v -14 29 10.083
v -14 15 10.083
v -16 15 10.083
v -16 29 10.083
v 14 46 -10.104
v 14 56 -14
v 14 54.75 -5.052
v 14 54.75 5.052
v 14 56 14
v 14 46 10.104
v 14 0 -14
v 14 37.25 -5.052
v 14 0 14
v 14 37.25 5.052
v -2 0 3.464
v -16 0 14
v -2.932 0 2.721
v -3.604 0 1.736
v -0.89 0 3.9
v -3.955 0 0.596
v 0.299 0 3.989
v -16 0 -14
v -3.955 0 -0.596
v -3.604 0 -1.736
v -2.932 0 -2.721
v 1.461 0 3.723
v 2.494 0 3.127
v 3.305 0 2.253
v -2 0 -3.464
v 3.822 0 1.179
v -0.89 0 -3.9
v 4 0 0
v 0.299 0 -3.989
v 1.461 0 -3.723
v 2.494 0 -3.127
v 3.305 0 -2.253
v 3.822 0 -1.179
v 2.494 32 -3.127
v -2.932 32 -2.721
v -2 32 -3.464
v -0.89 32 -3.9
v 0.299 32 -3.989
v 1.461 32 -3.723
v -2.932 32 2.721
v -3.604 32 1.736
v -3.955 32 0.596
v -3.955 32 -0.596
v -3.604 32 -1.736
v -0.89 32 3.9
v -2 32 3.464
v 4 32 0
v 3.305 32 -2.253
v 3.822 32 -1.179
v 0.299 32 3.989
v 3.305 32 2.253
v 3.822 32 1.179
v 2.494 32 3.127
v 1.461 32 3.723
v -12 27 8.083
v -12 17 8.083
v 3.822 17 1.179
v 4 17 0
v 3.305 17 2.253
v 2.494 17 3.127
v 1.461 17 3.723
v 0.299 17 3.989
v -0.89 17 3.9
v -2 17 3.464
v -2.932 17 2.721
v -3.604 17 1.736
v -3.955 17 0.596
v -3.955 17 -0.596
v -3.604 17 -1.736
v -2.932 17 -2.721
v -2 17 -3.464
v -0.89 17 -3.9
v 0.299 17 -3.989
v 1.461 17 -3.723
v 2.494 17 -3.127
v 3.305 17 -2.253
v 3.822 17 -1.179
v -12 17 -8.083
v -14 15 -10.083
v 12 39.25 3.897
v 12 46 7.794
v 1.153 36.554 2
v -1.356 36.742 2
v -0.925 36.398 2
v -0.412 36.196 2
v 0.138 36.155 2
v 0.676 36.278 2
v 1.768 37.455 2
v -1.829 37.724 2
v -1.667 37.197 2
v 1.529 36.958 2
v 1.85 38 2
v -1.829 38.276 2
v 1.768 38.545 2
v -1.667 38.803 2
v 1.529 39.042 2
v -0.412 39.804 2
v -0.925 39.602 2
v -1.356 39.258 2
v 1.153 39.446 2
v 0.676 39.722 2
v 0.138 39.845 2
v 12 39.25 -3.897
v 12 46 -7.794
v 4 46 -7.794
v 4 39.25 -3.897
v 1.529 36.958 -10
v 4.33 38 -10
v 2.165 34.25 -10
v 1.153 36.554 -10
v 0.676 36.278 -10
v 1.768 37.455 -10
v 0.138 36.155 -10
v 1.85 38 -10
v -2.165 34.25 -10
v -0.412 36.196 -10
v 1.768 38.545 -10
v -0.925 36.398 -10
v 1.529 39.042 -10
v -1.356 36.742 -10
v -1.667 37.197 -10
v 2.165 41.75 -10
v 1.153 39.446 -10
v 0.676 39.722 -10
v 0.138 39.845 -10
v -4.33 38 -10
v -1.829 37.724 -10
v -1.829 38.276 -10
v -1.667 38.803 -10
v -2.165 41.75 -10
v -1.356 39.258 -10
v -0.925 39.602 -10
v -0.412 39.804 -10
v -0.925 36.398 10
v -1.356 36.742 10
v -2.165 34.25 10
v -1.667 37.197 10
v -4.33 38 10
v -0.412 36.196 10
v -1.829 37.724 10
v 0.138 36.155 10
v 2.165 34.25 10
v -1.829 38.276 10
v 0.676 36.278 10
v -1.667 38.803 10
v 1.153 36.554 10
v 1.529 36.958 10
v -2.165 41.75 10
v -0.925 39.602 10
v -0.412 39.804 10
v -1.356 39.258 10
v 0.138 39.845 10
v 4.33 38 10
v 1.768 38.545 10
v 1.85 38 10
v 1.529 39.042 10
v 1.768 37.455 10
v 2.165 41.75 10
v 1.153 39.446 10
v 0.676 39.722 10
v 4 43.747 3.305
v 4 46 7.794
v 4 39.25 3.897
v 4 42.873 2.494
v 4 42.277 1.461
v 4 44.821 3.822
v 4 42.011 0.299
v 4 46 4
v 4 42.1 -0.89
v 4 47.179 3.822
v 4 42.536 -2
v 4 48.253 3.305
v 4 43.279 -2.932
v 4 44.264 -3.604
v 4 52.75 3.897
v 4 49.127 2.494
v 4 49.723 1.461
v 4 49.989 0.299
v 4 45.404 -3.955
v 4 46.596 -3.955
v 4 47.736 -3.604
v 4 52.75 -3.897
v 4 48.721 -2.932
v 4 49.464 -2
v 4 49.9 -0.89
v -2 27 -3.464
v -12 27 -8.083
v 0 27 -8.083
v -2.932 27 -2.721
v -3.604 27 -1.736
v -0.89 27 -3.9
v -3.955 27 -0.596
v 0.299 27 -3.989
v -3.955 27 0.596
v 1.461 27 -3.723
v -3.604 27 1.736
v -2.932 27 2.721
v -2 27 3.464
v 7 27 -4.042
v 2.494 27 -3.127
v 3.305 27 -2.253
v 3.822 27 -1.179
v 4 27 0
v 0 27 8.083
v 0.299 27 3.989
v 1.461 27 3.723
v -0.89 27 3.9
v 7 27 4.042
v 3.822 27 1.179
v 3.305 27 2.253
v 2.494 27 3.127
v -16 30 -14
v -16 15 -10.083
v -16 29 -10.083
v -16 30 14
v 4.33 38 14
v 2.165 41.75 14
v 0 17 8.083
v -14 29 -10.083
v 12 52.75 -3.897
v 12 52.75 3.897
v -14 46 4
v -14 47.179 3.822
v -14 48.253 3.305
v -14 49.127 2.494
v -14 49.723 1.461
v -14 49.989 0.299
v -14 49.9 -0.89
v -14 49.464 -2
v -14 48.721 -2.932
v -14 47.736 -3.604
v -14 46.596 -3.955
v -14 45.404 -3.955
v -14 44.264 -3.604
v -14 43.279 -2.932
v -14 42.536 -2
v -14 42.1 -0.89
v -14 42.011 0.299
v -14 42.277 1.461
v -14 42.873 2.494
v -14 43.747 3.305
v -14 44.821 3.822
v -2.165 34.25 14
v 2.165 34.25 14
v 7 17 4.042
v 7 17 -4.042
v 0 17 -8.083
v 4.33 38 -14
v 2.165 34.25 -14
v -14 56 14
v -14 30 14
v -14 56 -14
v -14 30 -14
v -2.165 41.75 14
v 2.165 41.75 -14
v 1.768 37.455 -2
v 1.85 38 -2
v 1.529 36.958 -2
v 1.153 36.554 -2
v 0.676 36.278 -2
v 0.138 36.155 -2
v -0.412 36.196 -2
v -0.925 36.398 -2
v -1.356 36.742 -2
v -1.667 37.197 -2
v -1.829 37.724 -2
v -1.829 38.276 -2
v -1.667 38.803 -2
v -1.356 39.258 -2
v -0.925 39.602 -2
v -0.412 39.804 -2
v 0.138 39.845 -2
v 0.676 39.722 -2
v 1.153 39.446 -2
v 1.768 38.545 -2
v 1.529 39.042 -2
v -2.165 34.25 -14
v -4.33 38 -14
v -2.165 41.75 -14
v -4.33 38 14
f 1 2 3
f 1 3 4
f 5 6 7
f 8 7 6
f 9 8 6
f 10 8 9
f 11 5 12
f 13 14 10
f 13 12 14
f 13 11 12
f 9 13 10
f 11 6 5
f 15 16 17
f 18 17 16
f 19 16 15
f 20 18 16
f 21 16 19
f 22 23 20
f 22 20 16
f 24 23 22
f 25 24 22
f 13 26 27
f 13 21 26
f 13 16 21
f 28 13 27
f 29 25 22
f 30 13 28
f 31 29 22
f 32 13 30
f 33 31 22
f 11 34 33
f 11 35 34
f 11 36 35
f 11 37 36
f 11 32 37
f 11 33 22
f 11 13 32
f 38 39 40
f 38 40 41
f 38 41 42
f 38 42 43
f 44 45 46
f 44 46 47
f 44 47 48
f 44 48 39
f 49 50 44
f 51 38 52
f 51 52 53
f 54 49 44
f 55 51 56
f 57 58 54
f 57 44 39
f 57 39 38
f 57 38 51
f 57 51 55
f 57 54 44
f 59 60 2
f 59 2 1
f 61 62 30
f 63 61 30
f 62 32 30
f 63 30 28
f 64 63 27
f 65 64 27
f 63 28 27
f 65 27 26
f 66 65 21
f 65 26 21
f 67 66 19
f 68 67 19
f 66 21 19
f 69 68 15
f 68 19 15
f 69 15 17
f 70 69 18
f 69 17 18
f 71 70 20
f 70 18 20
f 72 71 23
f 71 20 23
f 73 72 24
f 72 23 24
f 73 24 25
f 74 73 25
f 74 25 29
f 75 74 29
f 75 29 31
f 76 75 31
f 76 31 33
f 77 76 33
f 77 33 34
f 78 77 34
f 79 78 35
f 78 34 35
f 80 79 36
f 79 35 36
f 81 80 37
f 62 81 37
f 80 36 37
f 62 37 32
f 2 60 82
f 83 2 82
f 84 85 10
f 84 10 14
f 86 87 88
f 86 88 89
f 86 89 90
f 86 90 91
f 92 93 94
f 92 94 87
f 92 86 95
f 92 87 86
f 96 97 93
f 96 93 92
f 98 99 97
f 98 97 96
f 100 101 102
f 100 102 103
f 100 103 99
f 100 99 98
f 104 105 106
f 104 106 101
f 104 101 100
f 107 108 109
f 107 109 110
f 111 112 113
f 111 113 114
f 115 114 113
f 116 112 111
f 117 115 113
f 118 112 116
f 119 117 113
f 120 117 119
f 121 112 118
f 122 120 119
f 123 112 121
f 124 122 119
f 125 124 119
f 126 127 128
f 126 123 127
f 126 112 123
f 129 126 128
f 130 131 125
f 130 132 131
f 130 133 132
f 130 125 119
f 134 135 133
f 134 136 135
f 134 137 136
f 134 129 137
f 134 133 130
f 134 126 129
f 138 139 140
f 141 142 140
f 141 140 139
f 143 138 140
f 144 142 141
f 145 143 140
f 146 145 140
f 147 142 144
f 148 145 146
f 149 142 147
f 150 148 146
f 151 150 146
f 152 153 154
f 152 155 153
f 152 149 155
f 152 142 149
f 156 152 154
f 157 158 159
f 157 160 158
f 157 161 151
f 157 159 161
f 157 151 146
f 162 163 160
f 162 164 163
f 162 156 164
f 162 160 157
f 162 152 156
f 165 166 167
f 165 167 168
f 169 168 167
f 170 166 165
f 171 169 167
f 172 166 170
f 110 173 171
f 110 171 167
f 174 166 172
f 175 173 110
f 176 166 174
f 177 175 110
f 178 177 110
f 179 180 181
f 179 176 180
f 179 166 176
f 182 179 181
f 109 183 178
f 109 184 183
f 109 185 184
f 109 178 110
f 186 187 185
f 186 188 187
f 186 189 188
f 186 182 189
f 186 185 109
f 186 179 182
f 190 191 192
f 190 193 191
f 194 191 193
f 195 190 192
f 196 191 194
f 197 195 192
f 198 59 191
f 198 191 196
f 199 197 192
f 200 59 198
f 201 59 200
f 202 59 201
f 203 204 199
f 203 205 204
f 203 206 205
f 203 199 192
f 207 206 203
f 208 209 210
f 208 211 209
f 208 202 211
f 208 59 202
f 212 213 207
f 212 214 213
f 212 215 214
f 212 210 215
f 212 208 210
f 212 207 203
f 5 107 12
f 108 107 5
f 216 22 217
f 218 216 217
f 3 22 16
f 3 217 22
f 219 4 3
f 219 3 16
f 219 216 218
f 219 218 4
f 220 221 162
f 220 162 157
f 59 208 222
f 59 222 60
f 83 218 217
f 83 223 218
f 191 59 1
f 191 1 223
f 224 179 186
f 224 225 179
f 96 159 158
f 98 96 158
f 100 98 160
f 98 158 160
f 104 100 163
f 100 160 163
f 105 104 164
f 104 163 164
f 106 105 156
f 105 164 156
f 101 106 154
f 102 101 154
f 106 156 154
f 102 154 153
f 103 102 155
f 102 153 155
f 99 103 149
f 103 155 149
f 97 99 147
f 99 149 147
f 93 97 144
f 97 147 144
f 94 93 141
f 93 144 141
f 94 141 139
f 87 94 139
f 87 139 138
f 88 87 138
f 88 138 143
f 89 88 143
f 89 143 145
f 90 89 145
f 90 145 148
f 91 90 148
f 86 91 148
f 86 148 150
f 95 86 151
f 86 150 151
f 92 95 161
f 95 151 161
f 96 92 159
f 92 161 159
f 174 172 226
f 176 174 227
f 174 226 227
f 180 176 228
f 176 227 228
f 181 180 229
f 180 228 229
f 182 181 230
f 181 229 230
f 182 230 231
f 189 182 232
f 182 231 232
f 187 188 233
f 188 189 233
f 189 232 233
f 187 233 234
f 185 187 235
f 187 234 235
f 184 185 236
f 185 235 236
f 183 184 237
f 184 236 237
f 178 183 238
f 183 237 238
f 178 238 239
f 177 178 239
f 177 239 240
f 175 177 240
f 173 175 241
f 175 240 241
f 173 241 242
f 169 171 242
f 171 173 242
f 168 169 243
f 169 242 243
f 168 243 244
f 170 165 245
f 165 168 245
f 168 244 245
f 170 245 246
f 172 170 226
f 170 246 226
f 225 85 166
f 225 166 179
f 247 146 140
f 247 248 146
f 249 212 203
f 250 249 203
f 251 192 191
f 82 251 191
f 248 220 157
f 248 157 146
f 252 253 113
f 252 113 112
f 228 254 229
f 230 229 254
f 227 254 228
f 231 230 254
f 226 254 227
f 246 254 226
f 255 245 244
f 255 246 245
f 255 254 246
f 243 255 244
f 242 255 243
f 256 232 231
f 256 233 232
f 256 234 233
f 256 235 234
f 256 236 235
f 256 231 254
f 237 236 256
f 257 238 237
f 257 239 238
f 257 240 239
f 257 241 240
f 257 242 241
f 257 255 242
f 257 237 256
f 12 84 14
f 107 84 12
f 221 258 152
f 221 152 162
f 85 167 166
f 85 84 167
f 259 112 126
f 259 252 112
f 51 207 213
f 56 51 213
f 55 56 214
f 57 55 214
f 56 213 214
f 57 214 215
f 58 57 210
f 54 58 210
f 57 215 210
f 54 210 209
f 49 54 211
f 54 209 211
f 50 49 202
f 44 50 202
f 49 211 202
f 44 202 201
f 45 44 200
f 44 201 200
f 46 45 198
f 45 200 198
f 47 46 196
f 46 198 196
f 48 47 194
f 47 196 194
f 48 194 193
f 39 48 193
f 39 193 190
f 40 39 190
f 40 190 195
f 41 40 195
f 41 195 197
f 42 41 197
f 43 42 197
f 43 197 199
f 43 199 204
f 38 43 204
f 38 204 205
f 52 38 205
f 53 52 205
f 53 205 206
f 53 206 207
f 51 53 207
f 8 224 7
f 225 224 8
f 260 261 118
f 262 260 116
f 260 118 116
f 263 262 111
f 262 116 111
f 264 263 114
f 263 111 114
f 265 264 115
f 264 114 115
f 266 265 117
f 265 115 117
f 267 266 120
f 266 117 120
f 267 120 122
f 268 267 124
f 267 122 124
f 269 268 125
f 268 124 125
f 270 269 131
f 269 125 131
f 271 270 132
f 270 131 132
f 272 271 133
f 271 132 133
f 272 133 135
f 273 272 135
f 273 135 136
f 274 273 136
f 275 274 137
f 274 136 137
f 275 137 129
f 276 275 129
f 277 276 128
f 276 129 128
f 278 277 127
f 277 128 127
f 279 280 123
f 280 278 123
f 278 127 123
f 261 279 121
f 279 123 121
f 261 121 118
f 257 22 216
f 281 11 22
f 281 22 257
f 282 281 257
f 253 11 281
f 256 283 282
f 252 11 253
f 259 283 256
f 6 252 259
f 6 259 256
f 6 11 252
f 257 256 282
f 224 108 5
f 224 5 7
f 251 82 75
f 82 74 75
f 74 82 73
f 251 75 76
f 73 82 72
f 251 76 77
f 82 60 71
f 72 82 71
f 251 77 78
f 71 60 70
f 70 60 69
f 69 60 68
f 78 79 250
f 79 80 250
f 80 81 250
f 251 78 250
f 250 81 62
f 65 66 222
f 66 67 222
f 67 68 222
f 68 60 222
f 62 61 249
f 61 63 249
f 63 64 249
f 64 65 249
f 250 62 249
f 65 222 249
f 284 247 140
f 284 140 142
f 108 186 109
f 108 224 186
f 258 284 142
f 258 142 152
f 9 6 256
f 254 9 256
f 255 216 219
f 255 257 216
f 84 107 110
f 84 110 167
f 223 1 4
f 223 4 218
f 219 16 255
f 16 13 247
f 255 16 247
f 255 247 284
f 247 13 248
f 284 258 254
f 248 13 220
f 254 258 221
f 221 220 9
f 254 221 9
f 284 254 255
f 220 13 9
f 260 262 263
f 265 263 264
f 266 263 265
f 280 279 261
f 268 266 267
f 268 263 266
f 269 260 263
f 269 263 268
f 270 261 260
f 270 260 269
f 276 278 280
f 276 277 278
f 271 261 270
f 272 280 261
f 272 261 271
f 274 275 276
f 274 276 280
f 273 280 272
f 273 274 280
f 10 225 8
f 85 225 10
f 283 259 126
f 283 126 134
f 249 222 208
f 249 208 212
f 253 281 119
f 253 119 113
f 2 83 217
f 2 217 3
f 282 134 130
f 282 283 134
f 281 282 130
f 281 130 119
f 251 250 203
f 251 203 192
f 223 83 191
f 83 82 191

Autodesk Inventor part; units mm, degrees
ref_plane "YZ Plane" through (0, 0, 0) normal (1, 0, 0) x (0, 1, 0)
ref_plane "XZ Plane" through (0, 0, 0) normal (0, 1, 0) x (-1, 0, 0)
ref_plane "XY Plane" through (0, 0, 0) normal (0, 0, 1) x (1, 0, 0)
sketch "Эскиз1" plane through (0, 0, 0) normal (0, 1, 0) x (-1, 0, 0)
  line L0 (-14, 14) -> (14, 14)
  line L1 (14, 14) -> (14, -14)
  line L2 (14, -14) -> (-14, -14)
  line L3 (-14, -14) -> (-14, 14)
  line L4 (-14, 14) -> (14, -14) construction
  line L5 (14, 14) -> (-14, -14) construction
  point P0 (0, 0)
  dimension "d0" = 28
  dimension "d1" = 28
extrude "Выдавливание1" add sketch "Эскиз1" along normal blind 56
sketch "Эскиз2" plane through (0, 0, 0) normal (0, -1, 0) x (1, 0, 0)
  circle A0 centre (0, 0) radius 4
extrude "Выдавливание2" cut sketch "Эскиз2" against normal blind 32
sketch "Эскиз3" plane through (-14, 0, -14) normal (-1, 0, 0) x (0, 0, 1)
  circle A0 centre (14, 46) radius 4 projected
  point P0 (14, 0)
extrude "Выдавливание3" cut sketch "Эскиз3" against normal through all
sketch "Эскиз4" plane through (14, 0, 14) normal (1, 0, 0) x (0, 0, -1)
  circle A0 centre (14, 46) radius 4 projected
  line L0 (6.2058, 46) -> (10.1029, 52.75)
  line L1 (10.1029, 52.75) -> (17.8971, 52.75)
  line L2 (17.8971, 52.75) -> (21.7942, 46)
  line L3 (21.7942, 46) -> (17.8971, 39.25)
  line L4 (17.8971, 39.25) -> (10.1029, 39.25)
  line L5 (10.1029, 39.25) -> (6.2058, 46)
  line L6 (0, 56) -> (28, 56) projected
  point P0 (14, 0)
  dimension "d8" = 13.5
extrude "Выдавливание4" cut sketch "Эскиз4" against normal blind 10
chamfer "Фаска1" distance 2 angle 45 6 edges at (14, 39.25, 0) (14, 42.625, -5.8457) (14, 49.375, -5.8457) (14, 52.75, 0) (14, 49.375, 5.8457) (14, 42.625, 5.8457)
ref_plane "РабПлоскость1" through (0, 22, 0) normal (0, -1, 0) x (1, 0, 0)
sketch "Эскиз5" plane through (0, 22, 0) normal (0, -1, 0) x (1, 0, 0)
  line L0 (0, 8.0829) -> (7, 4.0415)
  line L1 (7, 4.0415) -> (7, -4.0415)
  line L2 (7, -4.0415) -> (0, -8.0829)
  line L3 (0, -8.0829) -> (-7, -4.0415)
  line L4 (-7, -4.0415) -> (-7, 4.0415)
  line L5 (-7, 4.0415) -> (0, 8.0829)
  line L6 (0, 8.0829) -> (-14, 8.0829)
  line L7 (-14, -14) -> (-14, 14) projected
  line L8 (0, -8.0829) -> (-14, -8.0829)
  line L9 (-14, 8.0829) -> (-14, -8.0829)
  point P0 (0, 0)
  point P1 (0, 0)
  dimension "d15" = 14
extrude "Выдавливание5" cut sketch "Эскиз5" along normal mid plane 10
chamfer "Фаска2" distance 2 angle 45 4 edges at (-14, 27, 0) (-14, 22, 8.0829) (-14, 17, 0) (-14, 22, -8.0829)
sketch "Эскиз6" plane through (-14, 0, -14) normal (-1, 0, 0) x (0, 0, 1)
  line L0 (28, 0) -> (28, 56) projected
  line L1 (0, 0) -> (0, 56) projected
  line L2 (28, 0) -> (0, 0)
  line L3 (0, 0) -> (0, 30)
  line L4 (0, 30) -> (28, 30)
  line L5 (28, 30) -> (28, 0)
  line L6 (24.0829, 15) -> (24.0829, 29) projected
  line L7 (3.9171, 15) -> (24.0829, 15) projected
  line L8 (3.9171, 29) -> (3.9171, 15) projected
  line L9 (24.0829, 29) -> (3.9171, 29) projected
  point P0 (14, 0)
  point P1 (28, 30)
  dimension "d21" = 30
extrude "Выдавливание6" add sketch "Эскиз6" along normal blind 2
sketch "Эскиз7" plane through (-14, 56, 14) normal (0, 0, 1) x (1, 0, 0)
  circle A0 centre (14, -18) radius 1.85 projected
  point P0 (14, -56)
extrude "Выдавливание7" cut sketch "Эскиз7" against normal blind 12
mirror "Зеркальное отражение1" about plane through (0, 0, 0) normal (0, 0, 1) of "Выдавливание7"
sketch "Эскиз8" plane through (-14, 56, 14) normal (0, 0, 1) x (1, 0, 0)
  circle A0 centre (14, -18) radius 1.85 projected
  line L0 (9.6699, -18) -> (11.8349, -14.25)
  line L1 (11.8349, -14.25) -> (16.1651, -14.25)
  line L2 (16.1651, -14.25) -> (18.3301, -18)
  line L3 (18.3301, -18) -> (16.1651, -21.75)
  line L4 (16.1651, -21.75) -> (11.8349, -21.75)
  line L5 (11.8349, -21.75) -> (9.6699, -18)
  point P0 (14, -56)
  dimension "d26" = 7.5
extrude "Выдавливание8" cut sketch "Эскиз8" against normal blind 4 contours A0 | L0 L1 L2 L3 L4 L5
mirror "Зеркальное отражение2" about plane through (0, 0, 0) normal (0, 0, 1) of "Выдавливание8"
equation "\"d1\" = d0"
equation "\"d2\" = 2 * d0"
properties part number "000.001.001 - Уголок" material "Пластик АБС"
